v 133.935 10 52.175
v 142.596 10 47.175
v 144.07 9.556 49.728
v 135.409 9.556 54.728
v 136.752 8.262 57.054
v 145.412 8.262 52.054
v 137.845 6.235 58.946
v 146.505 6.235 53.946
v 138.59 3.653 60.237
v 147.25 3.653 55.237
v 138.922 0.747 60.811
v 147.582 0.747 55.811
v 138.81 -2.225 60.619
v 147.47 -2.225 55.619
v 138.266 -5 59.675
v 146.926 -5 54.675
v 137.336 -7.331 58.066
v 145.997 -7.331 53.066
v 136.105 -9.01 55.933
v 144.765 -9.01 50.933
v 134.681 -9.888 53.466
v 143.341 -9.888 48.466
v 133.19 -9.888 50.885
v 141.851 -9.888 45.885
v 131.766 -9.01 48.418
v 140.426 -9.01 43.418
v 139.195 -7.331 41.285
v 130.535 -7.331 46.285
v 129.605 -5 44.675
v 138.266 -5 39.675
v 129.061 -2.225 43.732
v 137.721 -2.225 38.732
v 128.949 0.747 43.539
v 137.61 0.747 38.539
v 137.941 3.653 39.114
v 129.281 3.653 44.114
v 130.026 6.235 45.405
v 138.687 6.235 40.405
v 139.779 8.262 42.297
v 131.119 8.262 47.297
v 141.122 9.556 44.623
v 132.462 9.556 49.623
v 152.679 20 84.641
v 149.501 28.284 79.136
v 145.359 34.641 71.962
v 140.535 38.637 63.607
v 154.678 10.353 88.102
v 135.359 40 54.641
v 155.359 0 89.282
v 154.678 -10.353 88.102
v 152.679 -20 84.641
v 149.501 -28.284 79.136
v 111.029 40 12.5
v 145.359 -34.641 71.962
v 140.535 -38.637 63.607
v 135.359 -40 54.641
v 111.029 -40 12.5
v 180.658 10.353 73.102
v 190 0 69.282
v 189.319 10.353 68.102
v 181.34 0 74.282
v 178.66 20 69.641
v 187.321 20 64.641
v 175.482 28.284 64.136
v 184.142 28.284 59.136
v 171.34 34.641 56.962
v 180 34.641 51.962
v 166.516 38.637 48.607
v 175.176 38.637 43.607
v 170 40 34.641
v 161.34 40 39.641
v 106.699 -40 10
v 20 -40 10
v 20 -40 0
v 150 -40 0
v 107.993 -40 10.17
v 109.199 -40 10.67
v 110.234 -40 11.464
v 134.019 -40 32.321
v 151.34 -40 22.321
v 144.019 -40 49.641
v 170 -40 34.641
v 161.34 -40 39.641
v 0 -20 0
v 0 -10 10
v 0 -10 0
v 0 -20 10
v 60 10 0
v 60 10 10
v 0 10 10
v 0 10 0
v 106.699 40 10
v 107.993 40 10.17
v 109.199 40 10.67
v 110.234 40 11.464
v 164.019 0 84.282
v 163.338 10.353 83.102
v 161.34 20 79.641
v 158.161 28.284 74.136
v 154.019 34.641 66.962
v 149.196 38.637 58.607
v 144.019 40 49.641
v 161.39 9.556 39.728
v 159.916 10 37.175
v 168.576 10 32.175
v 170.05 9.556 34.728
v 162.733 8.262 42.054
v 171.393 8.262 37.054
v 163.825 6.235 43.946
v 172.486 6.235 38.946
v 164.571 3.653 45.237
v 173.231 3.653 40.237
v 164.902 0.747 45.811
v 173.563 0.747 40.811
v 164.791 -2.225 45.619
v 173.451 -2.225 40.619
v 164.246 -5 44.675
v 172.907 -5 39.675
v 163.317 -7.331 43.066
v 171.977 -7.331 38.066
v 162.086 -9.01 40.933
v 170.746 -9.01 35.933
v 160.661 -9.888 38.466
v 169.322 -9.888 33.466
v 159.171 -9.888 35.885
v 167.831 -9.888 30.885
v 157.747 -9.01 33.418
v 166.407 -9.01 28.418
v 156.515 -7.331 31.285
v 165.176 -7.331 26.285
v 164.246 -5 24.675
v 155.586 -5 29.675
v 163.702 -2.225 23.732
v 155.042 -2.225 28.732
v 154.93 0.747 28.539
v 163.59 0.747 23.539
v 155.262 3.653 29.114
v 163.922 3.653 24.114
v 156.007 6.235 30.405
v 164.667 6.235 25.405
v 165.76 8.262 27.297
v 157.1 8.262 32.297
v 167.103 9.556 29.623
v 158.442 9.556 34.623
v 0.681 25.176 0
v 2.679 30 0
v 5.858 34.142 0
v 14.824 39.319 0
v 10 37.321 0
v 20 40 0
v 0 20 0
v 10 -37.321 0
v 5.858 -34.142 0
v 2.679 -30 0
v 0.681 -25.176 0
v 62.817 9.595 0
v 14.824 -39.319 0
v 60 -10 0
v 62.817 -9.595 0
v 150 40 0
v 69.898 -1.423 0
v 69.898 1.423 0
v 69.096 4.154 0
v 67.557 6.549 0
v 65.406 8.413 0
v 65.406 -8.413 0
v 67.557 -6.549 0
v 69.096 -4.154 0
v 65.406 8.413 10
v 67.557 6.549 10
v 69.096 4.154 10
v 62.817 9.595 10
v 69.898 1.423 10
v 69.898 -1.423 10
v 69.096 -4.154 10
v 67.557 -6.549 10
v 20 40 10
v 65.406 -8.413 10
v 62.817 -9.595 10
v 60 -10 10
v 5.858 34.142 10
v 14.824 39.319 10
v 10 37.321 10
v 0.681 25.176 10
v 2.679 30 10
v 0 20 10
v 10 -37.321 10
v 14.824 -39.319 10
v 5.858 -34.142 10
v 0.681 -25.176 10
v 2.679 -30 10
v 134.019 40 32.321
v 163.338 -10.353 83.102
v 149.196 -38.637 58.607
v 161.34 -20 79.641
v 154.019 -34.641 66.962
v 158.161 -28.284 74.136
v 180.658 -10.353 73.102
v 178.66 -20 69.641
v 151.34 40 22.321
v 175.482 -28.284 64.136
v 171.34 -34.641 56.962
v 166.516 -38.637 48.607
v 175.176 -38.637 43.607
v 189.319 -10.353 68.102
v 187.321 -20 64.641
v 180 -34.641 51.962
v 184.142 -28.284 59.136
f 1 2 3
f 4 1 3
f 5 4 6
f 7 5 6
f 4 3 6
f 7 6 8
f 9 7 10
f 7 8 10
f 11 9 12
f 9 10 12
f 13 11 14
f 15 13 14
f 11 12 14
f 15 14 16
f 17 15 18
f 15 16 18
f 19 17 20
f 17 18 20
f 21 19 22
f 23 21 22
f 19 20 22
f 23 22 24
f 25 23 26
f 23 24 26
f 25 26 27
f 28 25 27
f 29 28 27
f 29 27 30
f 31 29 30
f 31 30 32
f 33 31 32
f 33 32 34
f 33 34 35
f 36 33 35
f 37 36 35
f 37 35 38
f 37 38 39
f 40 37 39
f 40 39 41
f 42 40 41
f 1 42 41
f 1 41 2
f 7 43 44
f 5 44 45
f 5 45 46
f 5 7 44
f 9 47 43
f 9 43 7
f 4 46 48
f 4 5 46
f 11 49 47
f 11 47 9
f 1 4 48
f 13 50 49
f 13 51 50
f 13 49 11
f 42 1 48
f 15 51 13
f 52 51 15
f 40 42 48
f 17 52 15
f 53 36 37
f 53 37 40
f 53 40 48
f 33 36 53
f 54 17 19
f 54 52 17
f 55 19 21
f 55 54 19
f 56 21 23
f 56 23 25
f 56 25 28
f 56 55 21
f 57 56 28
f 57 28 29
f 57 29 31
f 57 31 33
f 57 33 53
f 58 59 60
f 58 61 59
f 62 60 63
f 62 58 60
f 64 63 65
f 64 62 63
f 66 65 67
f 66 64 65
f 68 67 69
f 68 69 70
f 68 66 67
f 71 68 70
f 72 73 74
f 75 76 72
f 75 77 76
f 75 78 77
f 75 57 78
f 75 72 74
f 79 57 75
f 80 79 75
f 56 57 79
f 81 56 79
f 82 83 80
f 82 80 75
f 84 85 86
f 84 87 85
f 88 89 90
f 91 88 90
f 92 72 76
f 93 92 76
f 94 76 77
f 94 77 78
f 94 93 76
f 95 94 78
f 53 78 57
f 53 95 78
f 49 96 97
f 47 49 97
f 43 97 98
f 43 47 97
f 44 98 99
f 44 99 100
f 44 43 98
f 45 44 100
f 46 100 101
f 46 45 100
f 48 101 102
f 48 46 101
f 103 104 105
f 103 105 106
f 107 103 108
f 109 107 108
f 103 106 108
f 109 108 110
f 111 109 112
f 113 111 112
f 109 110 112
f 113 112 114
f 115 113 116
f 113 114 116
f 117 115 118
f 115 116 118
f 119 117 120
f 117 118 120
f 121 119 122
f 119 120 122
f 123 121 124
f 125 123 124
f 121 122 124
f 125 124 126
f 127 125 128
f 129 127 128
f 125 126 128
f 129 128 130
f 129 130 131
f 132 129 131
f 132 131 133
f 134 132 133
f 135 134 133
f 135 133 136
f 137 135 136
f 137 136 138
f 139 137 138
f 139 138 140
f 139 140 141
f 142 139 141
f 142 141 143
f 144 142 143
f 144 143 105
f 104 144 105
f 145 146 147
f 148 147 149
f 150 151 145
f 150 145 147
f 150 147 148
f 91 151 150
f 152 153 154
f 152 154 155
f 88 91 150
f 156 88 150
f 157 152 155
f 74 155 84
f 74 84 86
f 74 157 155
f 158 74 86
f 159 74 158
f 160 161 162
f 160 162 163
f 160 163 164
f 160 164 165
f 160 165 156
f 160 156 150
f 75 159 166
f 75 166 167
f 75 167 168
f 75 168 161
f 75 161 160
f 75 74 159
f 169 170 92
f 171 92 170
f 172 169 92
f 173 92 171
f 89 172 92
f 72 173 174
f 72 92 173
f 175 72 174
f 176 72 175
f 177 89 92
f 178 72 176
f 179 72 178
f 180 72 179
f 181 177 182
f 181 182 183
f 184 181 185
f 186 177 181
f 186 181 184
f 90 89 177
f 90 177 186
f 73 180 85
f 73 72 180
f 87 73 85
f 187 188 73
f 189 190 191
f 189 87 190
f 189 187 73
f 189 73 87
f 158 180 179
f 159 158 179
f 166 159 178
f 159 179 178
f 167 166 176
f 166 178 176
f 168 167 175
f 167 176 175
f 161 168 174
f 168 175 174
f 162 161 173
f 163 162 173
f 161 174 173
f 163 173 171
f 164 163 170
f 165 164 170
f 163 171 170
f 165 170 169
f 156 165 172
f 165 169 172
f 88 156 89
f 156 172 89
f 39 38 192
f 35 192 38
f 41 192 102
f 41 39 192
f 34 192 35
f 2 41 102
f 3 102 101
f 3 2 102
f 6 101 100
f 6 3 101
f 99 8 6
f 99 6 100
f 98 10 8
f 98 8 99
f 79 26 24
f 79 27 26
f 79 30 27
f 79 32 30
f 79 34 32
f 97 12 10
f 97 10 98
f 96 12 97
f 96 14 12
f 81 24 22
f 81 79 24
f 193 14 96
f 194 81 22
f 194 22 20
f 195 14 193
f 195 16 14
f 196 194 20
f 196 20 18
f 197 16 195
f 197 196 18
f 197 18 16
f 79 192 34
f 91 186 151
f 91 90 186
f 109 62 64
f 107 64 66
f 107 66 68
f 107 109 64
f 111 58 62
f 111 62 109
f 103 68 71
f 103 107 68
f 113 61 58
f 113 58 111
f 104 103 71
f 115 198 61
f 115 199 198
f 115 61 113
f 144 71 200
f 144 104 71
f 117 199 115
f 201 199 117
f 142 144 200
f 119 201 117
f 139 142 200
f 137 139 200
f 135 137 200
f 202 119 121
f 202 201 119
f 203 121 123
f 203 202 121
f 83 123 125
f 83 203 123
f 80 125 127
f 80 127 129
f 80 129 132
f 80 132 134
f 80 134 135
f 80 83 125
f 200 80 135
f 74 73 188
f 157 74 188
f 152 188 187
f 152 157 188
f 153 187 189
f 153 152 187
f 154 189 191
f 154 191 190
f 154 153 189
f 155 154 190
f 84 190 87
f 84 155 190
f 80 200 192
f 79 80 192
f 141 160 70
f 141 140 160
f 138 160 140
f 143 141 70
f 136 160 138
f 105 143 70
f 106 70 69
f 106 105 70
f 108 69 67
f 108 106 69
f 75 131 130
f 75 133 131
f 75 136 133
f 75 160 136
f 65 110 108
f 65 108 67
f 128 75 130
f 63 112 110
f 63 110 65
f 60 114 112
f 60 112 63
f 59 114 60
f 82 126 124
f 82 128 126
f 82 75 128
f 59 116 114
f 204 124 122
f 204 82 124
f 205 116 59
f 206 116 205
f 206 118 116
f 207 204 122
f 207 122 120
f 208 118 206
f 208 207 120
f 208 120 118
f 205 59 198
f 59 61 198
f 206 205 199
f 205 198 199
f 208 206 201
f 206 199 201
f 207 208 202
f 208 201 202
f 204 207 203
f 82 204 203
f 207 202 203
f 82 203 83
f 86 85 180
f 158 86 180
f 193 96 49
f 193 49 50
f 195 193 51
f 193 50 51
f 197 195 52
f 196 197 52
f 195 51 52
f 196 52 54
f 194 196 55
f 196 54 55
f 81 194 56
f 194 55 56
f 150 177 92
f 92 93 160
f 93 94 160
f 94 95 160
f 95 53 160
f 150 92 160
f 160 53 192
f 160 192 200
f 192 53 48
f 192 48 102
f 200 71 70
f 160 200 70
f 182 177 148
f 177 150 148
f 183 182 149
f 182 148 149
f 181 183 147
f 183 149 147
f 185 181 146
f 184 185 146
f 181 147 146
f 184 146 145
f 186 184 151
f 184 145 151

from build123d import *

# Parameters (mm, degrees)
F1_DEPTH = 40
F2_R     = 39.99999
F3_R     = 20
F5_D     = 20
F6_R     = 5
F8_DEPTH = 10.001


# Not quite as in the source:
# - a fillet or chamfer is up to 0.001 mm smaller than in the source, because OpenCascade refuses the exact size


with BuildPart() as f1:
    # F0 (on Front) → F1 (new body, symmetric)
    with BuildSketch(Plane.XZ):
        Polygon((0, 10), (0, 0), (150, 0), (190, 69.2820323028), (181.3397459622, 74.2820323028), (151.3397459622, 22.3205080757), (134.0192378865, 32.3205080757), (164.0192378865, 84.2820323028), (155.3589838486, 89.2820323028), (109.5854811567, 10), align=None)
    extrude(amount=F1_DEPTH, both=True)

    # F2 (radius 40 in the source; OpenCascade refuses exactly that, so slightly less here)
    f2_edges = [f1.edges().sort_by_distance(p)[0] for p in [
        (159.689111, -40, 86.782032),
        (159.689111, 40, 86.782032),
        (185.669873, 40, 71.782032),
        (185.669873, -40, 71.782032),
    ]]
    fillet(f2_edges, radius=F2_R)

    # F3
    f3_edges = [f1.edges().sort_by_distance(p)[0] for p in [
        (0, -40, 5),
        (0, 40, 5),
    ]]
    fillet(f3_edges, radius=F3_R)

    # F5 (through all)
    with Locations(Plane(origin=(77.8589838486, 0, -44.9519052838), x_dir=(0, -1, 0), z_dir=(-0.8660254038, 0, 0.5))):
        with Locations((0, 112.1529946162)):
            Hole(F5_D / 2)

    # F6
    f6_edges = [f1.edges().sort_by_distance(p)[0] for p in [
        (109.585481, 0, 10),
    ]]
    fillet(f6_edges, radius=F6_R)

    # F7 (on face) → F8 (cut, through all)
    with BuildSketch(Plane.XY.offset(10)):
        with BuildLine():
            Line((0, 0), (0, -10))
            Line((0, -10), (60, -10))
            ThreePointArc((60, -10), (70, 0), (60, 10))
            Line((60, 10), (0, 10))
            Line((0, 10), (0, 0))
        make_face()
    extrude(amount=-F8_DEPTH, mode=Mode.SUBTRACT)


solid = f1.part
